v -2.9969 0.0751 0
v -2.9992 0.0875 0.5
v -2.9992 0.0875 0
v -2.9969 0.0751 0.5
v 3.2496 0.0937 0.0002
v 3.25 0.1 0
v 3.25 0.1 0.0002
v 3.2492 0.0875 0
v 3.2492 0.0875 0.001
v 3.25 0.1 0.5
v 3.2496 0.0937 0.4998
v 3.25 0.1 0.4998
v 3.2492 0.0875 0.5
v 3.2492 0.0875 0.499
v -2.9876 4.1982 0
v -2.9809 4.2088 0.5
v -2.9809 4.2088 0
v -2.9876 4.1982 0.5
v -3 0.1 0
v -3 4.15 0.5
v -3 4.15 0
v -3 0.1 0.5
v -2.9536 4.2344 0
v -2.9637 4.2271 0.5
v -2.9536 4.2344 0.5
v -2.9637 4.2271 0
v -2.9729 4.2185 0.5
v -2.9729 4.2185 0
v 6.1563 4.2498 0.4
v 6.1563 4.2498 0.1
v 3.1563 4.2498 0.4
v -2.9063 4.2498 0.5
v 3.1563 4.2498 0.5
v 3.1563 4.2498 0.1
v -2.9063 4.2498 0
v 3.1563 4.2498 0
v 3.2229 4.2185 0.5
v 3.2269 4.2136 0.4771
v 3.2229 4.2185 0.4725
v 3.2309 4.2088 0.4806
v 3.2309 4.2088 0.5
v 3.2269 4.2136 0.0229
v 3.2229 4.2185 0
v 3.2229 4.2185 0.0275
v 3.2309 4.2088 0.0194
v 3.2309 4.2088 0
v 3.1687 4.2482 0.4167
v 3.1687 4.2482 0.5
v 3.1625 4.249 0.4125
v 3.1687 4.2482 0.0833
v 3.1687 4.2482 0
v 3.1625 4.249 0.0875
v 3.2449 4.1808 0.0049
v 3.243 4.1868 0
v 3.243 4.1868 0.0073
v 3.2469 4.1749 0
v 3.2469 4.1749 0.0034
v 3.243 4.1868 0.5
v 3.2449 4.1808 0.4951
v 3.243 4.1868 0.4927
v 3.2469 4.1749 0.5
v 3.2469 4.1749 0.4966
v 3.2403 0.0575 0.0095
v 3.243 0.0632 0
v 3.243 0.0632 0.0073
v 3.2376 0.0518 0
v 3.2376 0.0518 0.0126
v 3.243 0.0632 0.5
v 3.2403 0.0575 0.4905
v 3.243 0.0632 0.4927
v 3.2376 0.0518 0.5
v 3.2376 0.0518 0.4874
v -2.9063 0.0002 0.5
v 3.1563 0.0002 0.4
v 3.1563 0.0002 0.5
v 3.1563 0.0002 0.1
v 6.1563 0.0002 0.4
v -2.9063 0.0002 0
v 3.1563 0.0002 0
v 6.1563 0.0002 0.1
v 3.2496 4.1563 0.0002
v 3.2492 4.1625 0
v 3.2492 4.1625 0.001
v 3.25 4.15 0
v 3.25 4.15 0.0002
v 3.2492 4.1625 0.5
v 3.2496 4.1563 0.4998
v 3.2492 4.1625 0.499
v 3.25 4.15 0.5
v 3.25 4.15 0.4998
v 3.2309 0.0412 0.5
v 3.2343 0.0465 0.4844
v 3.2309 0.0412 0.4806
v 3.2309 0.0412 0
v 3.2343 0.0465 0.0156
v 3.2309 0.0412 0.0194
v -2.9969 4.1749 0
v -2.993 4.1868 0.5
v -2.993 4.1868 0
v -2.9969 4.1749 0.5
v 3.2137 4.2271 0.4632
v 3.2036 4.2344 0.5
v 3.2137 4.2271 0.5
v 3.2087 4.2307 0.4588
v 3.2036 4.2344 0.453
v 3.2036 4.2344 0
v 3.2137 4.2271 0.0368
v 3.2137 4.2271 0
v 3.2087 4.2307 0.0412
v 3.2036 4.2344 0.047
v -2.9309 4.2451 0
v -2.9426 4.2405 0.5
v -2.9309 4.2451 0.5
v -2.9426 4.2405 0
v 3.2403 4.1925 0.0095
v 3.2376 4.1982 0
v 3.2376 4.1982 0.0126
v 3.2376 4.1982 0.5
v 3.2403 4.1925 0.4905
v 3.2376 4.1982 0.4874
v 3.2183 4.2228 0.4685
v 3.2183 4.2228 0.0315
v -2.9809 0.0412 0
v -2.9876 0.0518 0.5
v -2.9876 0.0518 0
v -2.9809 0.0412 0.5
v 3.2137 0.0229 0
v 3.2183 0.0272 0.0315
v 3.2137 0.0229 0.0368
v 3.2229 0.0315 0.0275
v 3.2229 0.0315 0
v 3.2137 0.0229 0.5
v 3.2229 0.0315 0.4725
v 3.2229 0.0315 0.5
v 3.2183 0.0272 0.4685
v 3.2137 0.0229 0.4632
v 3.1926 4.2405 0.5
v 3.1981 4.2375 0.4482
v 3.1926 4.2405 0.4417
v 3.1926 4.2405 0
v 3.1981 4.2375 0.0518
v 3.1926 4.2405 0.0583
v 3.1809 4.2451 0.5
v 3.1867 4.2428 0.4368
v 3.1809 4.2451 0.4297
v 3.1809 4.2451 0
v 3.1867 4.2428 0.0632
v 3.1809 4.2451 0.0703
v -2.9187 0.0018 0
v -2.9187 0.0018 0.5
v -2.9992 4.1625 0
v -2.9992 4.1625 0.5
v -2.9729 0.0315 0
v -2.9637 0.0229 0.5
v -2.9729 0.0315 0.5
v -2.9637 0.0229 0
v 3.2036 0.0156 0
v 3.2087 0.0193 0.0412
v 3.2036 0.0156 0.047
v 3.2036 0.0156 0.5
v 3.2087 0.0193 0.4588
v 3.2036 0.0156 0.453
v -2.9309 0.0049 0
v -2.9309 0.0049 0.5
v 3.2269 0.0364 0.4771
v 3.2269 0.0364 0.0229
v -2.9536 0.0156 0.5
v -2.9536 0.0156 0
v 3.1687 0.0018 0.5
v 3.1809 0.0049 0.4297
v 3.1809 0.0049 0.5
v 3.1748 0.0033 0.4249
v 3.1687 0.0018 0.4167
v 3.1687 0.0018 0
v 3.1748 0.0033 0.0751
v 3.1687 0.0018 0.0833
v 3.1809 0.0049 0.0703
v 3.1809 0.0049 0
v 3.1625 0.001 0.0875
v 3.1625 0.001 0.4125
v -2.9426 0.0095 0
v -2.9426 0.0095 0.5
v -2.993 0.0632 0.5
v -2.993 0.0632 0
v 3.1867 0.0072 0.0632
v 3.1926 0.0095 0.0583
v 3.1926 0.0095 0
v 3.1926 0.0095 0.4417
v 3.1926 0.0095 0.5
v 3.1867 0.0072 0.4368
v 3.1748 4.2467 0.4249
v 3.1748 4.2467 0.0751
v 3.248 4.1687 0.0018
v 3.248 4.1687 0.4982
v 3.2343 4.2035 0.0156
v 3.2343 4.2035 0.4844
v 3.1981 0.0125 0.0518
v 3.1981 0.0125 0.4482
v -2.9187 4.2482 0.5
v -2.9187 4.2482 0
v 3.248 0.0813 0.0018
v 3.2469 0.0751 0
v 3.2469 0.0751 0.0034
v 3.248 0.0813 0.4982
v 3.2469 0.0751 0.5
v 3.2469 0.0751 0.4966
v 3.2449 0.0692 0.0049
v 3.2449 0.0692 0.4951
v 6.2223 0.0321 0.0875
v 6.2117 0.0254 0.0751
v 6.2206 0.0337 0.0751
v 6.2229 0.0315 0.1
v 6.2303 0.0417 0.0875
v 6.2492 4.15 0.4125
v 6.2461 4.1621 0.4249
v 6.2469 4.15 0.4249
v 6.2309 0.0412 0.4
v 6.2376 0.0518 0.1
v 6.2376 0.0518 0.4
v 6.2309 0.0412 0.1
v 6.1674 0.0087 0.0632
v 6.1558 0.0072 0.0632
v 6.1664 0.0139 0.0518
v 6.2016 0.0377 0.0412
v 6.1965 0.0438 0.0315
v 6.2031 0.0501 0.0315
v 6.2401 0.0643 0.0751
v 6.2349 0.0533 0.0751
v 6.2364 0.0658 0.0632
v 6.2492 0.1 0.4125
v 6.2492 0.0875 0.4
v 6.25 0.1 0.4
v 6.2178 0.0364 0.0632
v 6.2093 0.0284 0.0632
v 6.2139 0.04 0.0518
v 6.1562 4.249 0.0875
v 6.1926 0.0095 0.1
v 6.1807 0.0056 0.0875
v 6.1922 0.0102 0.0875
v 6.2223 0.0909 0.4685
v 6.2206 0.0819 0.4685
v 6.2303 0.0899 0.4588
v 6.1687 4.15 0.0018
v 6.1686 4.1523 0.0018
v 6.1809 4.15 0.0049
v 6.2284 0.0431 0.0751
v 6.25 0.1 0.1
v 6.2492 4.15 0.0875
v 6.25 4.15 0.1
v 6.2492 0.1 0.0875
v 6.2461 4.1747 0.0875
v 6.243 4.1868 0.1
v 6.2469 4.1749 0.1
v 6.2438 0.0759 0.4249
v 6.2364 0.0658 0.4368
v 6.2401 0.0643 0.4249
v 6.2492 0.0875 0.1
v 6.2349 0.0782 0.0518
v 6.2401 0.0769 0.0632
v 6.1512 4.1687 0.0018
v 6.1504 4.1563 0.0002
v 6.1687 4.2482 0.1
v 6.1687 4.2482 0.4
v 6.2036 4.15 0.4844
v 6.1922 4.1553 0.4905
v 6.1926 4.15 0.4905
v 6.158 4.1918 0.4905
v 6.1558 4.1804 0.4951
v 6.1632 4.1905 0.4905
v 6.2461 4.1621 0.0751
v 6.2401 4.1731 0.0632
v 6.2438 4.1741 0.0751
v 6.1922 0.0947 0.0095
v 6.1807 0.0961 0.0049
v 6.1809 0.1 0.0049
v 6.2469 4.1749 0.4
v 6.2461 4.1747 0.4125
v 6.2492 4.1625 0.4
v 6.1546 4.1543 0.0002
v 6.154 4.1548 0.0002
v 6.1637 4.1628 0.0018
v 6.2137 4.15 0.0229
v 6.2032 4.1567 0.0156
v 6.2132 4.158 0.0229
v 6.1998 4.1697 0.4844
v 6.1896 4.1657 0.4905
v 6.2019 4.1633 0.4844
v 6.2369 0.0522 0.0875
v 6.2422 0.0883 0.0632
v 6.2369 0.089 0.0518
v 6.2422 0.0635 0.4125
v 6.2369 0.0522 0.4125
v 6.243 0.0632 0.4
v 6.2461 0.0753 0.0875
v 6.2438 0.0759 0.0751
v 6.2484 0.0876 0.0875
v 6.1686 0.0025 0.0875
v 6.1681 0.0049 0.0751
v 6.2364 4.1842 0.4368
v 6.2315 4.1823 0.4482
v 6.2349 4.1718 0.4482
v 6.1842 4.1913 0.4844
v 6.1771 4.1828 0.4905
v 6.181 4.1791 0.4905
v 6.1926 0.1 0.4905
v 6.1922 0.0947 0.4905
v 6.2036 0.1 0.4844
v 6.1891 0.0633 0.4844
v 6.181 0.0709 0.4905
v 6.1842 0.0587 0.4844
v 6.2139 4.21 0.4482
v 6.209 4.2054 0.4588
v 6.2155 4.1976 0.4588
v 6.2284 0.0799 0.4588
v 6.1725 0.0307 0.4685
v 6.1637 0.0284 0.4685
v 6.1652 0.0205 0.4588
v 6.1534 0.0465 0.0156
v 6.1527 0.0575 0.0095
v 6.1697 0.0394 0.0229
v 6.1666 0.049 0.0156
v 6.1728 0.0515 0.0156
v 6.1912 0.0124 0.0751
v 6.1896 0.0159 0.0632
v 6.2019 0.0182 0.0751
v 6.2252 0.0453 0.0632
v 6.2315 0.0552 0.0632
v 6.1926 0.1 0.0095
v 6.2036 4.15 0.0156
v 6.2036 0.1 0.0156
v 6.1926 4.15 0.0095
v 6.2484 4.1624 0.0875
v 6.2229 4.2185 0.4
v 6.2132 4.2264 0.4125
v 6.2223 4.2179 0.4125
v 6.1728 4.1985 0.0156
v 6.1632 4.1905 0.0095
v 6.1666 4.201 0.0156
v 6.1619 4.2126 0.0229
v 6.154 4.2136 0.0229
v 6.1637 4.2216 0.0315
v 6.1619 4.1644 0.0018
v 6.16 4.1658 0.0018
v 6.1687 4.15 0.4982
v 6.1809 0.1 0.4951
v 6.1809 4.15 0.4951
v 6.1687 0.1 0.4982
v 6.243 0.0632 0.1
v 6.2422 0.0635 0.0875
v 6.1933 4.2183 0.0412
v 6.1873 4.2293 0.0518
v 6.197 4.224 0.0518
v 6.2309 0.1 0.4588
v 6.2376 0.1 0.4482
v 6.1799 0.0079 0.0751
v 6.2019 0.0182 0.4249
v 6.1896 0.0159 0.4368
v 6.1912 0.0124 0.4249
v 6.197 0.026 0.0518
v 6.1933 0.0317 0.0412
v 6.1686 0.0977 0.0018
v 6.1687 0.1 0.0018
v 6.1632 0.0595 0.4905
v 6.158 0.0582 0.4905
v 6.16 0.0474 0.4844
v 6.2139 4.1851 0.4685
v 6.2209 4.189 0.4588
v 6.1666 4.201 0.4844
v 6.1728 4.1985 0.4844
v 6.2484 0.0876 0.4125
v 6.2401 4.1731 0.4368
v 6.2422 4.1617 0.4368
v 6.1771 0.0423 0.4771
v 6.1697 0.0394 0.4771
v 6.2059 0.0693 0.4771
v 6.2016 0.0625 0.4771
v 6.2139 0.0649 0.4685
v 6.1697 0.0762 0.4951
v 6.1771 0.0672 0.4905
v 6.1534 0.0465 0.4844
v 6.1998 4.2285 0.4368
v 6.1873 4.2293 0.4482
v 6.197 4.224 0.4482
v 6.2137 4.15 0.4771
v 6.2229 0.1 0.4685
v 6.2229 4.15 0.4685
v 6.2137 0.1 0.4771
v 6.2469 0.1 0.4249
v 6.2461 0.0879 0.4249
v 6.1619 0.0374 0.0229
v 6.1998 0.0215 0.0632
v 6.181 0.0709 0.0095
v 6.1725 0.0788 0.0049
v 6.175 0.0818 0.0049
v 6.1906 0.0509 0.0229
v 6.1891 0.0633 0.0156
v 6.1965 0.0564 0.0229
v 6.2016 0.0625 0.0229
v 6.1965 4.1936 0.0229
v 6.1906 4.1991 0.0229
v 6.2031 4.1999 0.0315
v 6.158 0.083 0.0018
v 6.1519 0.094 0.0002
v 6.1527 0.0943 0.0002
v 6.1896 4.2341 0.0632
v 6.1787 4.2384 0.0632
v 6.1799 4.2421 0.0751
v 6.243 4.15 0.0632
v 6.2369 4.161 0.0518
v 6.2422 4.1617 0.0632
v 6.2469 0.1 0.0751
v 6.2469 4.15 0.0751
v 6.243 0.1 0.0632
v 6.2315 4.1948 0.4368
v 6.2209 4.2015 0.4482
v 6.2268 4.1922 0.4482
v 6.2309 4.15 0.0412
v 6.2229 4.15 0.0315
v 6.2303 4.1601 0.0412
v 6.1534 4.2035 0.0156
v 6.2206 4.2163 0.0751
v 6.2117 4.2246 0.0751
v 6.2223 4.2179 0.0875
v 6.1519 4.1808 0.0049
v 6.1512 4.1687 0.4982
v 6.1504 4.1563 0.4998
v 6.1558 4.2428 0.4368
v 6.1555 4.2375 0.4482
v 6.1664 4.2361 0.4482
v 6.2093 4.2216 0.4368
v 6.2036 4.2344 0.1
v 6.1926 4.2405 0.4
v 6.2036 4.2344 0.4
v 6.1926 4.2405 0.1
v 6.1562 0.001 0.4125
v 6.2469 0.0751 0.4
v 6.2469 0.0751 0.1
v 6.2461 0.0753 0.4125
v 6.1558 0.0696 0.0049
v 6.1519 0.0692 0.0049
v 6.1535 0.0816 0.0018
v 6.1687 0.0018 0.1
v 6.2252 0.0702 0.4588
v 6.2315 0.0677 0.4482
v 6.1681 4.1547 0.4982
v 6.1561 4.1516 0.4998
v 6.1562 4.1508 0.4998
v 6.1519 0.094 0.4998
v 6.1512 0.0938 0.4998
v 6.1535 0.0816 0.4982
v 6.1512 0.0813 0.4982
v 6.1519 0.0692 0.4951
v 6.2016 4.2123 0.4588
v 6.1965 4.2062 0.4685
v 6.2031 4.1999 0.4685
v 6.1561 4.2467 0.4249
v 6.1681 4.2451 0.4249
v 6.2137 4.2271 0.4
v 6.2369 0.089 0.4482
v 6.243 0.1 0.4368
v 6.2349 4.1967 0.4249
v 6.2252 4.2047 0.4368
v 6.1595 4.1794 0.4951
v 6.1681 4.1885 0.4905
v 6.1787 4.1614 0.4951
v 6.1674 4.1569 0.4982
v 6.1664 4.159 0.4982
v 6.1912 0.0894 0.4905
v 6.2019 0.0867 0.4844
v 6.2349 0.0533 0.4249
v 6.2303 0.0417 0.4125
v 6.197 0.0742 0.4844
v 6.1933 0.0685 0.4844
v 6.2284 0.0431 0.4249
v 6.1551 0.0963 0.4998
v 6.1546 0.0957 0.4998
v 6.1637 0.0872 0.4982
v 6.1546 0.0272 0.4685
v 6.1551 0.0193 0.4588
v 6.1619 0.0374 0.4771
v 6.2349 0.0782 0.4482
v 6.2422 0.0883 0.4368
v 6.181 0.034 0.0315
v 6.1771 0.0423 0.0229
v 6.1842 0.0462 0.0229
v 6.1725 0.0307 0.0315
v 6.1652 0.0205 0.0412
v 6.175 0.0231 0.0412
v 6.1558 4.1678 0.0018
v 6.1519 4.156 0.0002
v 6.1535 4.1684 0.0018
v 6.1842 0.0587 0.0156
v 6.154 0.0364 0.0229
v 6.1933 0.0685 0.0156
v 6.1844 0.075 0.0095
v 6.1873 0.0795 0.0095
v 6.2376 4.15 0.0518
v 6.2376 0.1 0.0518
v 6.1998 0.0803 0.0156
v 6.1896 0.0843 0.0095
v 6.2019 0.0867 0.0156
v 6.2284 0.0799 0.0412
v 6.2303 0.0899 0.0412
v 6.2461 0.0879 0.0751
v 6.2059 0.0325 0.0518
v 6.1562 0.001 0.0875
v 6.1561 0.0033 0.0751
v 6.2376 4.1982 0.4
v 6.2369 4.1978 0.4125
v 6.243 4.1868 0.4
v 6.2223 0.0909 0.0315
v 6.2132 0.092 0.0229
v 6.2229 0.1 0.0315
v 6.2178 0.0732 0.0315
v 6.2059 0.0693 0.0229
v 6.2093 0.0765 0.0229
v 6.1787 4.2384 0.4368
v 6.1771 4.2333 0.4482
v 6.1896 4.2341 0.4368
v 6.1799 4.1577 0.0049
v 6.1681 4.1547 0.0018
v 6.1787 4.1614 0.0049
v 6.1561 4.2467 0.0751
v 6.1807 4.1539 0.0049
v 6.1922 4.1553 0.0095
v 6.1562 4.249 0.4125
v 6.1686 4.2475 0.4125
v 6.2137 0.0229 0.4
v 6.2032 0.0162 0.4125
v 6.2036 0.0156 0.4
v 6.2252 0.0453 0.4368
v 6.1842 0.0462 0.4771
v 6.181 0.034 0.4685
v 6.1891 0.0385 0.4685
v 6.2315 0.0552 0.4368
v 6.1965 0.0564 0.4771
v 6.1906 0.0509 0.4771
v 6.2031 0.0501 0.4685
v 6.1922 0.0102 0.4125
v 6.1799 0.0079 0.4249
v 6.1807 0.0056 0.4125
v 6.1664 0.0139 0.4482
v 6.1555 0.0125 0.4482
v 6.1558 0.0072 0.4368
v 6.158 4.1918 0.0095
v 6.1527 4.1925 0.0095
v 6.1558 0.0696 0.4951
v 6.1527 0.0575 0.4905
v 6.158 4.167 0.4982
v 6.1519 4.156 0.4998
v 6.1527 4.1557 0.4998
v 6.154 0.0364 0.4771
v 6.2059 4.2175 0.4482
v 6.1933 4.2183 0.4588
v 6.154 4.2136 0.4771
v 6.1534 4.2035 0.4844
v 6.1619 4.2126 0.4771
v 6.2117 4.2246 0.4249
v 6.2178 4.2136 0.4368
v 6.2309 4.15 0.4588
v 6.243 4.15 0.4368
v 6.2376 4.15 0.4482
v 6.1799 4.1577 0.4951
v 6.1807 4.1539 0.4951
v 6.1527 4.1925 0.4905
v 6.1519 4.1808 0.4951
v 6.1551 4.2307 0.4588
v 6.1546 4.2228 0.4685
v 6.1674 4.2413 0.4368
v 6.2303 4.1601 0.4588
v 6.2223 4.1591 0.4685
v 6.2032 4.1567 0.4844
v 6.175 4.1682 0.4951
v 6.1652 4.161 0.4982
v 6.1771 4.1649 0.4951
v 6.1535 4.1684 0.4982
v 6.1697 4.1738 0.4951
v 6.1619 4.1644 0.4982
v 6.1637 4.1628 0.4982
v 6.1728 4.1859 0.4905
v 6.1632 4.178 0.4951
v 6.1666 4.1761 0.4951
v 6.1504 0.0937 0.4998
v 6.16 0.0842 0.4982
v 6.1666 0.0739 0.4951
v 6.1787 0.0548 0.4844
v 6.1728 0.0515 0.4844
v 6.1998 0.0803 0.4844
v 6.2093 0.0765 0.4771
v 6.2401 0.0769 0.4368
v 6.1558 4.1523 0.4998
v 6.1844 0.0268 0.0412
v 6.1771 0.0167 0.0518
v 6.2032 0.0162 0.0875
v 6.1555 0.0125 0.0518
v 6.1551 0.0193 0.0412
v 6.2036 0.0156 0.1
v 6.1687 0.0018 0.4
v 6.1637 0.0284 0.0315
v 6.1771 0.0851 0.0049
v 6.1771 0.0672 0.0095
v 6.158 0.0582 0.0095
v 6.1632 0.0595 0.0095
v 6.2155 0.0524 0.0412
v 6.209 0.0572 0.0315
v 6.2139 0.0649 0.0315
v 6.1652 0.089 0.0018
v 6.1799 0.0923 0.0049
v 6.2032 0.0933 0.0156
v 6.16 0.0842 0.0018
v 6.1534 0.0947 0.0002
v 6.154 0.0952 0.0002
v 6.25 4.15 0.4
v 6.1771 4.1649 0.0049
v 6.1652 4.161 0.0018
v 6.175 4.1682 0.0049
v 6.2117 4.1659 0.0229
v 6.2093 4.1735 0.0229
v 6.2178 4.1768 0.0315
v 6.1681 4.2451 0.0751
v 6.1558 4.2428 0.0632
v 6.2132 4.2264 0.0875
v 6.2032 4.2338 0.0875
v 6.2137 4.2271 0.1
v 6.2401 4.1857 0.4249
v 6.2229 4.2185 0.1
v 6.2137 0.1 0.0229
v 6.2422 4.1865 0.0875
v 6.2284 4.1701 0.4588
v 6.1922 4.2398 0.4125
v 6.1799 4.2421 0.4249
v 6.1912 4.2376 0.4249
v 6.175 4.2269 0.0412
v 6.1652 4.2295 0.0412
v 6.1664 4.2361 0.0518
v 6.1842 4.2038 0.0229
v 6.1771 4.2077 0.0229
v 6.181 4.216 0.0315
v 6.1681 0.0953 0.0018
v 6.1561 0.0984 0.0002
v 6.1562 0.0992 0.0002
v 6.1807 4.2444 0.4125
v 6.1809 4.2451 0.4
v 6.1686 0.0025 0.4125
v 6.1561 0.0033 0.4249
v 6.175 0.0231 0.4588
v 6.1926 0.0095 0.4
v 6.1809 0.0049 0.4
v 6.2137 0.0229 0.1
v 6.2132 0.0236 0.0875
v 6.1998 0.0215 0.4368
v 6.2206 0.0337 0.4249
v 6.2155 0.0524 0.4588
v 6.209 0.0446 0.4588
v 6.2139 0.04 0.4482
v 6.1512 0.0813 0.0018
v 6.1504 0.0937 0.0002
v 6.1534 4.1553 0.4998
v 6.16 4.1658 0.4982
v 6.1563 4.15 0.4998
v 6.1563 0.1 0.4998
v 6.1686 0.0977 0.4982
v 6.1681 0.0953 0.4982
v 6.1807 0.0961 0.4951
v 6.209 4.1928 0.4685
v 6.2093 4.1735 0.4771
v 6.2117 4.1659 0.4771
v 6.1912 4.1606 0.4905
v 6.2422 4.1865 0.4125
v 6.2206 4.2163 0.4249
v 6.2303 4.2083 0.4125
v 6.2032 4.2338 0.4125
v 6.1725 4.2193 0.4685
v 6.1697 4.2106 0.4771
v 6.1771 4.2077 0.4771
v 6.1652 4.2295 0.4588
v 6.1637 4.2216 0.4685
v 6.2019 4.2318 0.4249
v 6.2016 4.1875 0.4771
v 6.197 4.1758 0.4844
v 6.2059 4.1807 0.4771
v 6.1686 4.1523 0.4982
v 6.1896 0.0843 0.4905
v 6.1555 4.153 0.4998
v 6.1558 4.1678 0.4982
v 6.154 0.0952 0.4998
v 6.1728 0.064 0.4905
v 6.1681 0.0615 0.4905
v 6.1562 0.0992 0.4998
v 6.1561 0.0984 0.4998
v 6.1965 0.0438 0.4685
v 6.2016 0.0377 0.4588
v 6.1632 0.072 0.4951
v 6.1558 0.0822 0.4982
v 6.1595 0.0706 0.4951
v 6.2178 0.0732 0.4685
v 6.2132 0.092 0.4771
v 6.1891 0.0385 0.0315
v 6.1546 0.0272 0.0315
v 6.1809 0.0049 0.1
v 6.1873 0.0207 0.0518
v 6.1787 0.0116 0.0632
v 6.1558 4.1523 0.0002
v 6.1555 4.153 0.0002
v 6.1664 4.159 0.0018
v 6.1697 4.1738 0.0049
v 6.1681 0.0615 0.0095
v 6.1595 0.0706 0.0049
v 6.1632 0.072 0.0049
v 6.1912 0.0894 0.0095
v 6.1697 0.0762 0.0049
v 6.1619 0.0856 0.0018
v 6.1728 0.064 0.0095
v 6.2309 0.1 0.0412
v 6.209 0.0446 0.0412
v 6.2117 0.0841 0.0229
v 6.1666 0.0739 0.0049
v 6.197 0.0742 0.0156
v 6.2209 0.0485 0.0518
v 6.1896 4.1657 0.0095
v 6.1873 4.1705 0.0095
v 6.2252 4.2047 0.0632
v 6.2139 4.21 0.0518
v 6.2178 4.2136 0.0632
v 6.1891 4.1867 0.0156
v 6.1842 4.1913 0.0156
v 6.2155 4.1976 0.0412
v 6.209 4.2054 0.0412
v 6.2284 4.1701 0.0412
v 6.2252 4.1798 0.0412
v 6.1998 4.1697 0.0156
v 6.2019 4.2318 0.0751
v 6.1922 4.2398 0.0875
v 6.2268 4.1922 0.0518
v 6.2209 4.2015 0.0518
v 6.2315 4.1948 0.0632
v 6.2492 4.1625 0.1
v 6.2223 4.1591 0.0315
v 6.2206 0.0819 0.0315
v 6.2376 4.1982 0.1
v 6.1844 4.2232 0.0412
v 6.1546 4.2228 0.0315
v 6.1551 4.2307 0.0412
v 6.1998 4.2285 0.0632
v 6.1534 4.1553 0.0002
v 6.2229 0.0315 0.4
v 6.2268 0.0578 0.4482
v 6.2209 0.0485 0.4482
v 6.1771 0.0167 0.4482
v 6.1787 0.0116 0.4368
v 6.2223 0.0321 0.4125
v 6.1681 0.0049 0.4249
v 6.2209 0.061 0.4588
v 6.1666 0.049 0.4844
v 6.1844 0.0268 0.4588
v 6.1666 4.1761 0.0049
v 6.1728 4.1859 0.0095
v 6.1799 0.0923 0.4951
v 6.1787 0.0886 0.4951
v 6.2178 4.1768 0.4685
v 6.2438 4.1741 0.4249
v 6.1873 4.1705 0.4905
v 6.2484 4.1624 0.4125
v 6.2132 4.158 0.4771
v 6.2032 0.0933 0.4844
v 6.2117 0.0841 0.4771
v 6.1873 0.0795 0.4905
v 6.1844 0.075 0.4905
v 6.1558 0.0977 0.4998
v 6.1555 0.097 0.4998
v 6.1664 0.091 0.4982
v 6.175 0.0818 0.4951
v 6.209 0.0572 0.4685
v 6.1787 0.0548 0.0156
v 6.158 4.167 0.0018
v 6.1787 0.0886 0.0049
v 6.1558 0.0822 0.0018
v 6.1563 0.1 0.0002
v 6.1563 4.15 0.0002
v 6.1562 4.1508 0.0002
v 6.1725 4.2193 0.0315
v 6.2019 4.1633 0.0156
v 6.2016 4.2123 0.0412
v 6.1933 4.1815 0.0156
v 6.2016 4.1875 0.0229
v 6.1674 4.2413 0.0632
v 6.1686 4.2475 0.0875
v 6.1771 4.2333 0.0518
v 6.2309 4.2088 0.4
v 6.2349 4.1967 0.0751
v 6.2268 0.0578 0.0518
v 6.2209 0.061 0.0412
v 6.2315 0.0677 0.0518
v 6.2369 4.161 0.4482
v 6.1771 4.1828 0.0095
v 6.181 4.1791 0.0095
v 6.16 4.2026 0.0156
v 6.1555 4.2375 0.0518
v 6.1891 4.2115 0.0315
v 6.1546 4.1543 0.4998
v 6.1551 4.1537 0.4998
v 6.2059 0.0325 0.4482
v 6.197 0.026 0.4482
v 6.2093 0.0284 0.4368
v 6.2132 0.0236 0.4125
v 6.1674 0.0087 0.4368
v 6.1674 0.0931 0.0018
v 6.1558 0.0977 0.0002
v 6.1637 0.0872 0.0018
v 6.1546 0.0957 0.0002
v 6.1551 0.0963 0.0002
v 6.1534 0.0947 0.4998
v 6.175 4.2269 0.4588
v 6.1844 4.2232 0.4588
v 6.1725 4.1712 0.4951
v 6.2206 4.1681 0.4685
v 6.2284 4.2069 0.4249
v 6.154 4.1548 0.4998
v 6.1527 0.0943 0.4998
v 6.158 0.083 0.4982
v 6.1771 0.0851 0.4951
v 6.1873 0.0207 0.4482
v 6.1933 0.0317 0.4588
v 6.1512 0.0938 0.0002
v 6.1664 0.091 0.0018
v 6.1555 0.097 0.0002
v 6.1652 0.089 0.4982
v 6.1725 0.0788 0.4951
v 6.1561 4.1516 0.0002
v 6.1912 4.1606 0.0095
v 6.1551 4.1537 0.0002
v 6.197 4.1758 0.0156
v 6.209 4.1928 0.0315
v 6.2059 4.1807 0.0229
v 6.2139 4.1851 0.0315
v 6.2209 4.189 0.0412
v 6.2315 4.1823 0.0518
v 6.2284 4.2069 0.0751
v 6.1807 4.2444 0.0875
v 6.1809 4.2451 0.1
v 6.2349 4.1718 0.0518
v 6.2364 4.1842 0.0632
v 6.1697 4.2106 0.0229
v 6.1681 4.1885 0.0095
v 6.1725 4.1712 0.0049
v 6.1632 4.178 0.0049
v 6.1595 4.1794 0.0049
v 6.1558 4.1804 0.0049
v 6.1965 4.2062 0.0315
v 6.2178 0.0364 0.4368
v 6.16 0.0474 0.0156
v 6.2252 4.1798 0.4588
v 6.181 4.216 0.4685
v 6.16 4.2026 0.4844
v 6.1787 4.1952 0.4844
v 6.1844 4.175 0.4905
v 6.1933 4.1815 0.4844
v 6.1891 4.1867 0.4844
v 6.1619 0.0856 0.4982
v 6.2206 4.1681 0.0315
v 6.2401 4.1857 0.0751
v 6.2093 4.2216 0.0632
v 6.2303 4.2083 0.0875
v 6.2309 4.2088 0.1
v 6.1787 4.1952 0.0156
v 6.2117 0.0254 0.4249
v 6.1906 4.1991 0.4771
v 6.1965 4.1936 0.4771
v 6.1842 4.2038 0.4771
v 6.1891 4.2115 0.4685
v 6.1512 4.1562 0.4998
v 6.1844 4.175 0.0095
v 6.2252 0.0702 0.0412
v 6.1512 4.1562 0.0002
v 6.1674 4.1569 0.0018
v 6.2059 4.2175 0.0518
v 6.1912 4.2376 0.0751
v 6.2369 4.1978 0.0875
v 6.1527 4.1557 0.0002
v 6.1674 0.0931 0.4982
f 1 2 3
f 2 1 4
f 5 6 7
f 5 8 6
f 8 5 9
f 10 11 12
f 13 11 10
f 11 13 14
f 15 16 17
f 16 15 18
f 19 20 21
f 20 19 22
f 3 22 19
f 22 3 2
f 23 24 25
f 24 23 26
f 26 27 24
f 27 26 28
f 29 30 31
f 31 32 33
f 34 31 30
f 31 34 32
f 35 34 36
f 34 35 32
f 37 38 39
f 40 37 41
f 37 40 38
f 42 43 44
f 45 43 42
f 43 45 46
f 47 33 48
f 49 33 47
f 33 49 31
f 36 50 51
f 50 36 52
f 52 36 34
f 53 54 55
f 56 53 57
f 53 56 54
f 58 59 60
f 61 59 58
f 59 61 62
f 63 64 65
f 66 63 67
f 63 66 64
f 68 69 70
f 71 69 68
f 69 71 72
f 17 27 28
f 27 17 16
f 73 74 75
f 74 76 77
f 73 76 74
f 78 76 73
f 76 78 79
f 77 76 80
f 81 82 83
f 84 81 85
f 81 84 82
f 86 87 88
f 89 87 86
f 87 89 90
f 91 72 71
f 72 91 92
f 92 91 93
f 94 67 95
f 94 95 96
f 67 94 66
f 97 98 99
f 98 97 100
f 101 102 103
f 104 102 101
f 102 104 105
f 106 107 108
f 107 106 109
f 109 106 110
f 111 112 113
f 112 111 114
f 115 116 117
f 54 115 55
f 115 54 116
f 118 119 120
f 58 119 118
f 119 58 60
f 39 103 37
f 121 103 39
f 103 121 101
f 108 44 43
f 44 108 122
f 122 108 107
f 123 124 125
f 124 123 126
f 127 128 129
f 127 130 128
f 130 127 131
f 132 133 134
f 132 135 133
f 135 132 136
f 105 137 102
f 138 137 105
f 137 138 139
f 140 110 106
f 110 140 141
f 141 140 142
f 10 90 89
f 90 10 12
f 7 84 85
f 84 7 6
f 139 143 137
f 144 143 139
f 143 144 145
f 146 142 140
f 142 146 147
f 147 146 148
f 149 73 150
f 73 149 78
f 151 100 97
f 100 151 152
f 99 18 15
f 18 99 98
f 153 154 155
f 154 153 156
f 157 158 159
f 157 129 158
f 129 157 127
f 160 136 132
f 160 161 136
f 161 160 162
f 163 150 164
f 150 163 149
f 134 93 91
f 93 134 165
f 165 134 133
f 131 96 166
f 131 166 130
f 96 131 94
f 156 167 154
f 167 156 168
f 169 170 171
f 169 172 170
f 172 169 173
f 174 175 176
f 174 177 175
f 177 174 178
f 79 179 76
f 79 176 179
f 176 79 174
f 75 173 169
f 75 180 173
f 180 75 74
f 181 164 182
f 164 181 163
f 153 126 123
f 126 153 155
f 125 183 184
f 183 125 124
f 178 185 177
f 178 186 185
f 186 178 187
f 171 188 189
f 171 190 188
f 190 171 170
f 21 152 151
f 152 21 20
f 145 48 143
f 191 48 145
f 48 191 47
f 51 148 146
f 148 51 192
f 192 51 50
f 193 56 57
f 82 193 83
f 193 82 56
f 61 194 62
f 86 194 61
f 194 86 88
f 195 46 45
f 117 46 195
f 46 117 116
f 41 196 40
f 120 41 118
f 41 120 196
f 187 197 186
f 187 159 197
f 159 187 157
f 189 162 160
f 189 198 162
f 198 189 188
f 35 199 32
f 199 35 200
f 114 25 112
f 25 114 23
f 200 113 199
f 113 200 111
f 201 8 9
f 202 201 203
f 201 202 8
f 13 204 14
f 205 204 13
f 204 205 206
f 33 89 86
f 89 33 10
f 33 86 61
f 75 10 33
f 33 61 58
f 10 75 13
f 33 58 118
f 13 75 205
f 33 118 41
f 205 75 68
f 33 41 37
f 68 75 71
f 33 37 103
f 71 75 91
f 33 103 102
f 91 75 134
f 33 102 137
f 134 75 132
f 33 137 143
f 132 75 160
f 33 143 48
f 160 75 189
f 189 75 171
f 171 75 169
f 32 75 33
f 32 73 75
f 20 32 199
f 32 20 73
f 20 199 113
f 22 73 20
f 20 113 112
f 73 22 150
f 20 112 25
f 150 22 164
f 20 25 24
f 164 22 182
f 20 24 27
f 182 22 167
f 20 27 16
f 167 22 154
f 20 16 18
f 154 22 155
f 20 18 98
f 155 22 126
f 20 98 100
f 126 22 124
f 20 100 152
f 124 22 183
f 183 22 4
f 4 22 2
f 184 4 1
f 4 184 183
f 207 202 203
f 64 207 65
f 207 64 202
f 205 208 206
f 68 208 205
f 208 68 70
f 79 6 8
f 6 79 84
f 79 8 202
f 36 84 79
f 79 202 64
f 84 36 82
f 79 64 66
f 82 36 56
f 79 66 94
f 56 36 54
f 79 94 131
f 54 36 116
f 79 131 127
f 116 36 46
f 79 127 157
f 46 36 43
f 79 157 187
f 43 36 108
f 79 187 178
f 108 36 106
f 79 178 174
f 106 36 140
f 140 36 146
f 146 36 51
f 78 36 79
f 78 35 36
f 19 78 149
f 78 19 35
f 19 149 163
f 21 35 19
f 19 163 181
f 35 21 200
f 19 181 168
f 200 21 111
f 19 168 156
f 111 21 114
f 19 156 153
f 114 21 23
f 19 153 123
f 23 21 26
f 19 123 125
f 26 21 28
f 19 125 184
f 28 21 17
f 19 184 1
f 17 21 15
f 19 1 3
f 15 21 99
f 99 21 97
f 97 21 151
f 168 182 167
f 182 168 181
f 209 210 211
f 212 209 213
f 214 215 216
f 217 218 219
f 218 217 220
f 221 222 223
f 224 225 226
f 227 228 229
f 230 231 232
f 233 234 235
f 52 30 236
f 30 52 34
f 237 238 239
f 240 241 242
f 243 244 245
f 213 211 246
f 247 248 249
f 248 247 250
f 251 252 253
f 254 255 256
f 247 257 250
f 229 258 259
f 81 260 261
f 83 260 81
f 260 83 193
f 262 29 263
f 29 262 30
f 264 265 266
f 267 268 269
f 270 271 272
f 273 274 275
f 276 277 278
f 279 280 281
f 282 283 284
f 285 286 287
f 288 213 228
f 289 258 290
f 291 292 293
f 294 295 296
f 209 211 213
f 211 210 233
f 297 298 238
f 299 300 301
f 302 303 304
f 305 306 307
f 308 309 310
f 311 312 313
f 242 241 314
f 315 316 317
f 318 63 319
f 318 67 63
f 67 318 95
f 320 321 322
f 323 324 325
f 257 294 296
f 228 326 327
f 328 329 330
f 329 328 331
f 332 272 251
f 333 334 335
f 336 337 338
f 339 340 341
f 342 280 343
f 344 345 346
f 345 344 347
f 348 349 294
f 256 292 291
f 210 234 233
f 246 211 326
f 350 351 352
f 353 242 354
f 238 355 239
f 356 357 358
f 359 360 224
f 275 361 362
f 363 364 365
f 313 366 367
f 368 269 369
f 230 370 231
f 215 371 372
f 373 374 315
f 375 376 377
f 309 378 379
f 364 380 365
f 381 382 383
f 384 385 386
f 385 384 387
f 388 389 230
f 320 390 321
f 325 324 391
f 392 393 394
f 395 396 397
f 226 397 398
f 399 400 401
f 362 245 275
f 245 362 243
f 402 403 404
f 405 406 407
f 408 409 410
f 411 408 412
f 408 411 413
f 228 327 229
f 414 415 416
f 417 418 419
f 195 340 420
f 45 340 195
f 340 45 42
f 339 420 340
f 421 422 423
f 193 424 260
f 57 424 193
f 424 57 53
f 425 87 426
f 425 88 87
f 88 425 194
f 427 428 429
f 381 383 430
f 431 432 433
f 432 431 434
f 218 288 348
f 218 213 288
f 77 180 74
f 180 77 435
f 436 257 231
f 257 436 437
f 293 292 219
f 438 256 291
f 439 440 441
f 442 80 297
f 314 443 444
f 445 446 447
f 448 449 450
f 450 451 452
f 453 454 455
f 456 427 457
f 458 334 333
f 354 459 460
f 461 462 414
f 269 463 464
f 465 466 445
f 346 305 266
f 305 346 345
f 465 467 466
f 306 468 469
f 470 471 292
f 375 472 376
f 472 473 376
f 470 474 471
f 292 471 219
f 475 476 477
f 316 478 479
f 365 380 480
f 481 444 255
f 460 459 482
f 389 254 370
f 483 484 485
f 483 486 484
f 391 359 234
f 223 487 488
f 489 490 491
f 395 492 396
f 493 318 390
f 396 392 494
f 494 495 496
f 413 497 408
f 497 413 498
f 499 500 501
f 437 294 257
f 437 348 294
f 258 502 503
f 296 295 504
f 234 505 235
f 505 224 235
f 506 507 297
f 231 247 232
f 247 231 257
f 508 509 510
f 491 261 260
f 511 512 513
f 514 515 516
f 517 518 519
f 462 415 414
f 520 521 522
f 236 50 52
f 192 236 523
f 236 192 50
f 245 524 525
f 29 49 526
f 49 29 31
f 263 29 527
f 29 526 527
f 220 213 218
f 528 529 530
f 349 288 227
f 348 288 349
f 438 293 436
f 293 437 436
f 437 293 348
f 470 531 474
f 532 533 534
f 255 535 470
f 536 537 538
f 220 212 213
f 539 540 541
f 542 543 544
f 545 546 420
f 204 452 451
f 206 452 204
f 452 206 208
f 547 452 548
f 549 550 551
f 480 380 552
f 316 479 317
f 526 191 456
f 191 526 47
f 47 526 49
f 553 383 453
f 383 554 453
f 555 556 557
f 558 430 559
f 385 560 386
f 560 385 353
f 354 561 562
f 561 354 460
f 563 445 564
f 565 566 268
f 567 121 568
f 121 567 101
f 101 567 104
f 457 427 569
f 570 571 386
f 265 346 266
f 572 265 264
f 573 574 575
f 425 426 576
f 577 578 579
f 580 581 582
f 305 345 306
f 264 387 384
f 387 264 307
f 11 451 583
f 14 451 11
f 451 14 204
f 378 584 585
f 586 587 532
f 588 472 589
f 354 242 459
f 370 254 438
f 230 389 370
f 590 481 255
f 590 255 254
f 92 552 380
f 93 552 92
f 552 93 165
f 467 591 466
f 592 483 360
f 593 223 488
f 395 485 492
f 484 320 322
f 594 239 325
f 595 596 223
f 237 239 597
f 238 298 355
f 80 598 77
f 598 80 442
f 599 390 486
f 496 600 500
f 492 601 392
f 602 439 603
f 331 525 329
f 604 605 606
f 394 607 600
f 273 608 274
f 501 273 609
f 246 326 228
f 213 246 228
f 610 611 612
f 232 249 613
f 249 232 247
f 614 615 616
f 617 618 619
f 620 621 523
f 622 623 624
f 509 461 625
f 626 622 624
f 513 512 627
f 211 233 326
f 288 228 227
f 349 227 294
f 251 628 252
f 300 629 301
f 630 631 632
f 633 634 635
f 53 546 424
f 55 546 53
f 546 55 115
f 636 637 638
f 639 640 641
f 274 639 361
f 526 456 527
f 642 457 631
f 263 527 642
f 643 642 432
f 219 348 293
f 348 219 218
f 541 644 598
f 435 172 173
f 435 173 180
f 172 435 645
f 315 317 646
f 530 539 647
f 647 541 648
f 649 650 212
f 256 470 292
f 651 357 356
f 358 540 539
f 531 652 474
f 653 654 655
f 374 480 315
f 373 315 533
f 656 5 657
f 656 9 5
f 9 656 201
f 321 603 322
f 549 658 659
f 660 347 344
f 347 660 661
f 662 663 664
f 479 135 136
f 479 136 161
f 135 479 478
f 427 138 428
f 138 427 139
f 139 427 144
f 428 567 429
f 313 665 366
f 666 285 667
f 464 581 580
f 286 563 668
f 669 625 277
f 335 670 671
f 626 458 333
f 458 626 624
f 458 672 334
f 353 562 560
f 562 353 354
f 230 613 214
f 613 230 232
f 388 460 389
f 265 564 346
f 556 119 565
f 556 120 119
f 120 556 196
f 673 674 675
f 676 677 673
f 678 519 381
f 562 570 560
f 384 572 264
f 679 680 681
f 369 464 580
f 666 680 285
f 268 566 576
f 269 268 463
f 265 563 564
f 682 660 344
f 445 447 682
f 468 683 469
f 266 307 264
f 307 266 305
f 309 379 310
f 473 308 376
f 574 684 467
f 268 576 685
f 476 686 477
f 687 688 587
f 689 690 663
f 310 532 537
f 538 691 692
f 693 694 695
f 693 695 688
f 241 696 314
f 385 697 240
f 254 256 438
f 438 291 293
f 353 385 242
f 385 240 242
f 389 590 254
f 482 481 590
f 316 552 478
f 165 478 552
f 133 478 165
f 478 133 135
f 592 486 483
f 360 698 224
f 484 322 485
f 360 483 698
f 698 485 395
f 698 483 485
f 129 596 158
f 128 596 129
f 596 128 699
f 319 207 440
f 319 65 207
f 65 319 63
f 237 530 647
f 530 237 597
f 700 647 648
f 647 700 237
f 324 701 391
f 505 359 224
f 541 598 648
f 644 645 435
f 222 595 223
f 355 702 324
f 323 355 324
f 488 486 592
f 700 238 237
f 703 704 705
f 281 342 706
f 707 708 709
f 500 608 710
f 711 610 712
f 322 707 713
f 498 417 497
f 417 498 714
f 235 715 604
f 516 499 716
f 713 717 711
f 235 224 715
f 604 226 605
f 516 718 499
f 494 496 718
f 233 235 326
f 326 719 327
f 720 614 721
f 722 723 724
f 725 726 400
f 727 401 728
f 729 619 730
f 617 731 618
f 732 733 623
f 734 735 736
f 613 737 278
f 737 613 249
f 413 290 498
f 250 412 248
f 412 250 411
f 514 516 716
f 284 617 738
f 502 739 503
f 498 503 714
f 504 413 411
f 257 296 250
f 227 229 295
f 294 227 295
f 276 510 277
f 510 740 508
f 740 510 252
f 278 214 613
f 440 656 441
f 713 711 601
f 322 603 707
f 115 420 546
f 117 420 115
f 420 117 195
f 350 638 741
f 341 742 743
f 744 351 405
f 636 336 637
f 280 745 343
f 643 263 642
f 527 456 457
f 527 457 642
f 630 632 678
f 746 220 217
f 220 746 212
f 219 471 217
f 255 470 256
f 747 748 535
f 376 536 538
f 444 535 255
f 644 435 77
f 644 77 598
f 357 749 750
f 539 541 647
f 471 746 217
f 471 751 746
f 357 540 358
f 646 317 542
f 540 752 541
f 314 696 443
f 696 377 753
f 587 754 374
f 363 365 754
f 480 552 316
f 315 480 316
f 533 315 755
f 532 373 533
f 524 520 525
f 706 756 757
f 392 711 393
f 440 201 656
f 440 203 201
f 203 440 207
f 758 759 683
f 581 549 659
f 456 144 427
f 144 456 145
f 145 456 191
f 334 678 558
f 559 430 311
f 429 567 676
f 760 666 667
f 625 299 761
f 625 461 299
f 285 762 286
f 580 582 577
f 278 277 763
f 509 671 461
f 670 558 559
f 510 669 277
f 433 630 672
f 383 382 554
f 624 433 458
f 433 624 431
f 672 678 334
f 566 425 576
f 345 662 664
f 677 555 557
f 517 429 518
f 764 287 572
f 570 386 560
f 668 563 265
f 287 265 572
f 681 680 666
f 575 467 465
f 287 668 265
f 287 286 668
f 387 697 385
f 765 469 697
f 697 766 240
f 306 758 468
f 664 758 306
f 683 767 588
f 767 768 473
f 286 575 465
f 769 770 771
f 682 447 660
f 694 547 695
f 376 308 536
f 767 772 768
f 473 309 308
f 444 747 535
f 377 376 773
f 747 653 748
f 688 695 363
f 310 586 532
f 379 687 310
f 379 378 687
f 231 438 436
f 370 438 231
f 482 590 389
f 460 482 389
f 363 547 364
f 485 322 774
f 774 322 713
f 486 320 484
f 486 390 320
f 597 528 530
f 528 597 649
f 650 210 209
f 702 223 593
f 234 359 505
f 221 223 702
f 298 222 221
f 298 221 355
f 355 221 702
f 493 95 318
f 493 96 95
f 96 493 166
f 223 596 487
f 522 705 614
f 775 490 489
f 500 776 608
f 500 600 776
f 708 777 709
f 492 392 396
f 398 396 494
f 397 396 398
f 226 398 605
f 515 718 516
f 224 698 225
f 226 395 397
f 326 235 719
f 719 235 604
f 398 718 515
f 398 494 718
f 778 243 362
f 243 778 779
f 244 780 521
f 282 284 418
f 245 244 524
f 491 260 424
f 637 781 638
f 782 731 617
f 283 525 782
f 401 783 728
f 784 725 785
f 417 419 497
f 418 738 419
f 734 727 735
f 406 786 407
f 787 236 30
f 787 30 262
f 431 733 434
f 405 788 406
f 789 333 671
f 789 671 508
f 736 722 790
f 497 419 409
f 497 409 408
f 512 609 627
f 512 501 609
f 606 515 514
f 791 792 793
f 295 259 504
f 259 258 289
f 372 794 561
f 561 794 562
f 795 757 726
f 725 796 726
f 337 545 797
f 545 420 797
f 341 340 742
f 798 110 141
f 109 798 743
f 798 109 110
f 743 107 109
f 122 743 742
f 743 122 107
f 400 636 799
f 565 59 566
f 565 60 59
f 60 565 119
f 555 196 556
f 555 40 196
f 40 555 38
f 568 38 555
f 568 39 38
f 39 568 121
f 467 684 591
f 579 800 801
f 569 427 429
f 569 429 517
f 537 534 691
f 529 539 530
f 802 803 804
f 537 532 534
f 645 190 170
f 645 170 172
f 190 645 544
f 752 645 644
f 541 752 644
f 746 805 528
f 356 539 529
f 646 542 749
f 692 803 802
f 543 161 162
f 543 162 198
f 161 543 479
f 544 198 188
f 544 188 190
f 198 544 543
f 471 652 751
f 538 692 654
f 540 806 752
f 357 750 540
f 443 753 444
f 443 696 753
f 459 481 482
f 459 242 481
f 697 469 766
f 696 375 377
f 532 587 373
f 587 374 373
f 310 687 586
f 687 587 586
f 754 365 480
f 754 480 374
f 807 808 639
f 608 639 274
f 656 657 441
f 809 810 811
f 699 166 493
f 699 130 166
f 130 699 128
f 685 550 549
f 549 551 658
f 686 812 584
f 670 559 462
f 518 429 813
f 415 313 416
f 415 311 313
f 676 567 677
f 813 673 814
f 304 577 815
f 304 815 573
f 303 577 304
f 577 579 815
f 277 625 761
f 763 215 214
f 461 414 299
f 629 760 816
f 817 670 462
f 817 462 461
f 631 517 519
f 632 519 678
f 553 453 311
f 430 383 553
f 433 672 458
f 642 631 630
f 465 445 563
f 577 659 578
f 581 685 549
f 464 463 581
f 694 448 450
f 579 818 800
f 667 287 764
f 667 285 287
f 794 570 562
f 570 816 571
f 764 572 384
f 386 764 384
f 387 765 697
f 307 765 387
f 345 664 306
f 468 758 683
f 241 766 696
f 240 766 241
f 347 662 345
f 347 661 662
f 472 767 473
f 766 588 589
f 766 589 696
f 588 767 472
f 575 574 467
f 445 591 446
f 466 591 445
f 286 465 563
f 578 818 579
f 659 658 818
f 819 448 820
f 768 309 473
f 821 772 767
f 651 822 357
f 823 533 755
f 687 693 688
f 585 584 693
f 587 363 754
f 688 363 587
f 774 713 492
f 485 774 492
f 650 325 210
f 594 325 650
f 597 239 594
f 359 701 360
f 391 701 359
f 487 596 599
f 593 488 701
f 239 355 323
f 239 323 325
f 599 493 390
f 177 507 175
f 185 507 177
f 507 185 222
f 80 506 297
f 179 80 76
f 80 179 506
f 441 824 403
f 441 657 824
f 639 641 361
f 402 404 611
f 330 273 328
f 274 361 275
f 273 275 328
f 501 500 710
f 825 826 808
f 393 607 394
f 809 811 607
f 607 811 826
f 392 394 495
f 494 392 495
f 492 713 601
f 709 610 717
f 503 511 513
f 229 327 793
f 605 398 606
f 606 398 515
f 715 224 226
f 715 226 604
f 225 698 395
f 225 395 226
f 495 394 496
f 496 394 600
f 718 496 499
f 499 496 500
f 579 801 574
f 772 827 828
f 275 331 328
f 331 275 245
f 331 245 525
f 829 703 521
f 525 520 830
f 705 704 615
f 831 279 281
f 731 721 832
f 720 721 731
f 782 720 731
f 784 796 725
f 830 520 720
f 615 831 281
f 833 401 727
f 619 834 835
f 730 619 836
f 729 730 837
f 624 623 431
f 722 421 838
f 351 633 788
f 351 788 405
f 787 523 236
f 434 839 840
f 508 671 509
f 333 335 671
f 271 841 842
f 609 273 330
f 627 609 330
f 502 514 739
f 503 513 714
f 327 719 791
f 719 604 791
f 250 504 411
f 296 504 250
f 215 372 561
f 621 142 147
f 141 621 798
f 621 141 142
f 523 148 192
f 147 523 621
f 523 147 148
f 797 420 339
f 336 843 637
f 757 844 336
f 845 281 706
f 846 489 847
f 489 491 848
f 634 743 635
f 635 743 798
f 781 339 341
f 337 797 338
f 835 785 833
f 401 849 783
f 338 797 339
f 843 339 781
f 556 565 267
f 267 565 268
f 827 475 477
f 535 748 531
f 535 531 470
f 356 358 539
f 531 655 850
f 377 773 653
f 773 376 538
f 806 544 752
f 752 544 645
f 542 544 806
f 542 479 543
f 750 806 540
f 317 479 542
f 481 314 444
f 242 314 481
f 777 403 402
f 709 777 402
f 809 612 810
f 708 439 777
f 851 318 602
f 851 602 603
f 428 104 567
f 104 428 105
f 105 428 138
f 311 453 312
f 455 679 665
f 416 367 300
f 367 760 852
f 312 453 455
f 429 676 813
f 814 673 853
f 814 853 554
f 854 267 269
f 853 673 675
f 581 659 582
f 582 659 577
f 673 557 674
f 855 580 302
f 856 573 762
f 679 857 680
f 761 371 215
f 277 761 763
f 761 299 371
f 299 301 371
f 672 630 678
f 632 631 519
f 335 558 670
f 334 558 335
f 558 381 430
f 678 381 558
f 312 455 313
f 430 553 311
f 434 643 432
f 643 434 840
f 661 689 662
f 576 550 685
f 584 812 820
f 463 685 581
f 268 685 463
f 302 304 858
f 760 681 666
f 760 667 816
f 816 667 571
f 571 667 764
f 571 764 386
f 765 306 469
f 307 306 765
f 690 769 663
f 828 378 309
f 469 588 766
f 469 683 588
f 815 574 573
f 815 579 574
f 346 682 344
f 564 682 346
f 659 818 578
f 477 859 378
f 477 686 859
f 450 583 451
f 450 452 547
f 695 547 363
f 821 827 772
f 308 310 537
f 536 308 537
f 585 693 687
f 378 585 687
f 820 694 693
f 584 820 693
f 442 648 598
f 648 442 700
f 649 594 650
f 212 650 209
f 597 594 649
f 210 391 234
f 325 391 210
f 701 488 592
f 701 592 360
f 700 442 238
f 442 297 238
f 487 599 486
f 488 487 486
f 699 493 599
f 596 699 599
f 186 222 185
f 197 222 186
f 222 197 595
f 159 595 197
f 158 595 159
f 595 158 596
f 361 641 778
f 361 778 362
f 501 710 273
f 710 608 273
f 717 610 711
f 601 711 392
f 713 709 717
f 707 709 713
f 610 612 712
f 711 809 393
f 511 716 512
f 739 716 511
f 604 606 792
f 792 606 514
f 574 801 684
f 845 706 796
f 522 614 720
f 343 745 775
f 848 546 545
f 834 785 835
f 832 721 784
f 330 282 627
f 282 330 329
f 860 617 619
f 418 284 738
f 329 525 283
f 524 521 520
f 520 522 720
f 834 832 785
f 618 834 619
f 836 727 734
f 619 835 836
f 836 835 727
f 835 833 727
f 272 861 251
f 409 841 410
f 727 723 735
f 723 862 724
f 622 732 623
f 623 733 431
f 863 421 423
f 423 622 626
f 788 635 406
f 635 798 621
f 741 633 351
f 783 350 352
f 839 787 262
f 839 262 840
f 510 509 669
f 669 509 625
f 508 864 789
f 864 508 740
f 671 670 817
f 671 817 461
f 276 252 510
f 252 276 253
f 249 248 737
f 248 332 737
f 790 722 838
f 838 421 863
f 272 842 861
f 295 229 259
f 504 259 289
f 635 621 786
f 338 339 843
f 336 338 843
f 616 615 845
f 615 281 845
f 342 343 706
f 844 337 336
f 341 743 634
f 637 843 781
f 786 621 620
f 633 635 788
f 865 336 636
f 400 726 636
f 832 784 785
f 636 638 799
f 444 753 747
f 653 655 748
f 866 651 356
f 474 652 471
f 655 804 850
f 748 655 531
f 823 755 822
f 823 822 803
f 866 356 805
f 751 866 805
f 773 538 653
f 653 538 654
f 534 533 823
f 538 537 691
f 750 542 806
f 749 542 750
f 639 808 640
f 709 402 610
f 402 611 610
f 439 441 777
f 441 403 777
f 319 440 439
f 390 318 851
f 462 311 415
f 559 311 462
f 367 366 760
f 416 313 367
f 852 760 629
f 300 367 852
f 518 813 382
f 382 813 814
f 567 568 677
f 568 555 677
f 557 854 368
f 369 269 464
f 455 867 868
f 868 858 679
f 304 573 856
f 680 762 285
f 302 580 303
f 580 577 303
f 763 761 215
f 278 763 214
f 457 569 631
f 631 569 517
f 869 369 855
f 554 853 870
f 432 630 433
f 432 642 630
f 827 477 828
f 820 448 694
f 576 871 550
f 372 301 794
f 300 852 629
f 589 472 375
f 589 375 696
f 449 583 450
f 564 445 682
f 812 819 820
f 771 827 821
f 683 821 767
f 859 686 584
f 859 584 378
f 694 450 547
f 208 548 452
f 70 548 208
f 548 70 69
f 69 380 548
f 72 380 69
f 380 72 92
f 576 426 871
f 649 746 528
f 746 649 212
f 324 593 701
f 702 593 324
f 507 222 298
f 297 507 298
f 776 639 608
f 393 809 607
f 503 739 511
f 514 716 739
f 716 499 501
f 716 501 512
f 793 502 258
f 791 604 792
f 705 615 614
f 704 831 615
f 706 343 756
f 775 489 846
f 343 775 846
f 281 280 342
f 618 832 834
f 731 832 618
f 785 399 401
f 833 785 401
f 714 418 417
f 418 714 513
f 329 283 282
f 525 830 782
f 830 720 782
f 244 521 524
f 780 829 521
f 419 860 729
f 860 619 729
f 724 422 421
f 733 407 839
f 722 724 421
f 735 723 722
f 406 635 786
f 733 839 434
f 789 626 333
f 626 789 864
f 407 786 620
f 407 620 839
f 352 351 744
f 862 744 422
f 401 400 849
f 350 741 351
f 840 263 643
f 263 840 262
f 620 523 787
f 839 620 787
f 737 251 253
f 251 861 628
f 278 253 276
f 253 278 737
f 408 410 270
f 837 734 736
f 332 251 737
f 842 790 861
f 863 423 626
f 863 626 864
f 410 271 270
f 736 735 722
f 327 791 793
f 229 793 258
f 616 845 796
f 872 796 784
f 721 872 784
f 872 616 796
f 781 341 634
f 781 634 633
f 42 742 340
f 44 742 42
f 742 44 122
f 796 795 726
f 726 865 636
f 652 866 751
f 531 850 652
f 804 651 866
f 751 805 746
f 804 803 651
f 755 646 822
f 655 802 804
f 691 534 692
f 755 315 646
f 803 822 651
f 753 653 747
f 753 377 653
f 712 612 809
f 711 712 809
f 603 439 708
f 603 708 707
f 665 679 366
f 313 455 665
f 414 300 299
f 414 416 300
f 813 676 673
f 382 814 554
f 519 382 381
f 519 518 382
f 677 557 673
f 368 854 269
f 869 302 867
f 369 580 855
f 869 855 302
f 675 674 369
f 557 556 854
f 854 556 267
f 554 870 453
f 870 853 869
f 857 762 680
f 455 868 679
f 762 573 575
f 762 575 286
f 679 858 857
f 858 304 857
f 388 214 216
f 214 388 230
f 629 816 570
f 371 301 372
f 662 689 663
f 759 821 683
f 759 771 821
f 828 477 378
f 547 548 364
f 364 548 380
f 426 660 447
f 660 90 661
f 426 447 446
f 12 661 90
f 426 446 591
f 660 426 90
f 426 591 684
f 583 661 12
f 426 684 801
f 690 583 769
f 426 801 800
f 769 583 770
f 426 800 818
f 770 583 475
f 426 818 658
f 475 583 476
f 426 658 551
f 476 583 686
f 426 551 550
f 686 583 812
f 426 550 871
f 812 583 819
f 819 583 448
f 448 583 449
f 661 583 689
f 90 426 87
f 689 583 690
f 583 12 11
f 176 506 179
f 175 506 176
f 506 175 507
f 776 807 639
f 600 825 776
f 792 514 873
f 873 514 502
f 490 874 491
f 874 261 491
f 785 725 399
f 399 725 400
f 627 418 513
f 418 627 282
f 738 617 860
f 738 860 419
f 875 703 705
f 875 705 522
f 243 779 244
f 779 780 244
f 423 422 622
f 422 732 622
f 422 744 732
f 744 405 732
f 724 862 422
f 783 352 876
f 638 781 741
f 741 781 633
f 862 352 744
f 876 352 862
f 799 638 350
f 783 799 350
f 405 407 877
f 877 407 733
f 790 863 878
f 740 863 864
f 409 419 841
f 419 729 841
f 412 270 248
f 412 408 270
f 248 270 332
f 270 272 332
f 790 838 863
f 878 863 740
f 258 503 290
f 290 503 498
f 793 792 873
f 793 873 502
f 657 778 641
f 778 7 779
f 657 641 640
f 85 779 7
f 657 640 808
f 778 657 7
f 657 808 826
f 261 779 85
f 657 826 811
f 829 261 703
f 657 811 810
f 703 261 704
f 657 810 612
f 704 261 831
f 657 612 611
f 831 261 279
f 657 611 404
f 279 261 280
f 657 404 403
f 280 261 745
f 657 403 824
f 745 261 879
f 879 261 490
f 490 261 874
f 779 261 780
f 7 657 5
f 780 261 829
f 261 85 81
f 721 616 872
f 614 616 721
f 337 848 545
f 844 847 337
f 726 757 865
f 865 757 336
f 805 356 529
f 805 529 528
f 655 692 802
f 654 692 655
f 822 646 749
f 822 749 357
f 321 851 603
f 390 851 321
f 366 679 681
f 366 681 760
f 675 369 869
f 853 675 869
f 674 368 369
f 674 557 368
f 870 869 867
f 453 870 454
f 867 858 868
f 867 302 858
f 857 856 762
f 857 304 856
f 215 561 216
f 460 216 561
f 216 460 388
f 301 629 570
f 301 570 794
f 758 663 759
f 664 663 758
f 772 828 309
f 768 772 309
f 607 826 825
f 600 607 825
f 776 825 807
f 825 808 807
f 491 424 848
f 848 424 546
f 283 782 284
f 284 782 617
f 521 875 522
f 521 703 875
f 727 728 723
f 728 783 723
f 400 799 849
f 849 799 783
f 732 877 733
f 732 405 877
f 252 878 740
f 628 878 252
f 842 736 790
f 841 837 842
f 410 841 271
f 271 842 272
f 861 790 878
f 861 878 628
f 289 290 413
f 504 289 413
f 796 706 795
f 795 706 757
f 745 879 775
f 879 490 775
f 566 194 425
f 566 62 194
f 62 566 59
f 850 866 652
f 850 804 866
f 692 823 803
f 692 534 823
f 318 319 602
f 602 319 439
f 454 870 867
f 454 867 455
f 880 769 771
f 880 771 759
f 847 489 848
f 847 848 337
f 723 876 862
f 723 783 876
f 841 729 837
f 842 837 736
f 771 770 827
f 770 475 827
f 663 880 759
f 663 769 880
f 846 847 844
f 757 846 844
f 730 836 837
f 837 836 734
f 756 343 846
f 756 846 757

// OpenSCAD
r = .1;
z = .5;
x = 6.25;
y = 4.25;

$fn=50;

module roundcube(size, radius)
{
	x = size[0];
	y = size[1];
	z = size[2];
	r = radius;
	
	hull()
	{
		// bottom
		translate([r,r,r])
		sphere(r);
		translate([x-r,r,r])
		sphere(r);
		translate([r,y-r,r])
		sphere(r);
		translate([x-r,y-r,r])
		sphere(r);

		// top
		translate([r,r,z-r])
		sphere(r);
		translate([x-r,r,z-r])
		sphere(r);
		translate([r,y-r,z-r])
		sphere(r);
		translate([x-r,y-r,z-r])
		sphere(r);
	}
}

module roundcube_2d(size, radius)
{
	x = size[0];
	y = size[1];
	z = size[2];
	r = radius;

	linear_extrude(height=z)
	hull()
	{
		// bottom
		translate([r,r,r])
		circle(r);
		translate([x-r,r,r])
		circle(r);
		translate([r,y-r,r])
		circle(r);
		translate([x-r,y-r,r])
		circle(r);
	}
}

color("green")
translate([-3,0,0])
roundcube_2d([x,y,z],r);

color("red")
roundcube([x,y,z],r);
